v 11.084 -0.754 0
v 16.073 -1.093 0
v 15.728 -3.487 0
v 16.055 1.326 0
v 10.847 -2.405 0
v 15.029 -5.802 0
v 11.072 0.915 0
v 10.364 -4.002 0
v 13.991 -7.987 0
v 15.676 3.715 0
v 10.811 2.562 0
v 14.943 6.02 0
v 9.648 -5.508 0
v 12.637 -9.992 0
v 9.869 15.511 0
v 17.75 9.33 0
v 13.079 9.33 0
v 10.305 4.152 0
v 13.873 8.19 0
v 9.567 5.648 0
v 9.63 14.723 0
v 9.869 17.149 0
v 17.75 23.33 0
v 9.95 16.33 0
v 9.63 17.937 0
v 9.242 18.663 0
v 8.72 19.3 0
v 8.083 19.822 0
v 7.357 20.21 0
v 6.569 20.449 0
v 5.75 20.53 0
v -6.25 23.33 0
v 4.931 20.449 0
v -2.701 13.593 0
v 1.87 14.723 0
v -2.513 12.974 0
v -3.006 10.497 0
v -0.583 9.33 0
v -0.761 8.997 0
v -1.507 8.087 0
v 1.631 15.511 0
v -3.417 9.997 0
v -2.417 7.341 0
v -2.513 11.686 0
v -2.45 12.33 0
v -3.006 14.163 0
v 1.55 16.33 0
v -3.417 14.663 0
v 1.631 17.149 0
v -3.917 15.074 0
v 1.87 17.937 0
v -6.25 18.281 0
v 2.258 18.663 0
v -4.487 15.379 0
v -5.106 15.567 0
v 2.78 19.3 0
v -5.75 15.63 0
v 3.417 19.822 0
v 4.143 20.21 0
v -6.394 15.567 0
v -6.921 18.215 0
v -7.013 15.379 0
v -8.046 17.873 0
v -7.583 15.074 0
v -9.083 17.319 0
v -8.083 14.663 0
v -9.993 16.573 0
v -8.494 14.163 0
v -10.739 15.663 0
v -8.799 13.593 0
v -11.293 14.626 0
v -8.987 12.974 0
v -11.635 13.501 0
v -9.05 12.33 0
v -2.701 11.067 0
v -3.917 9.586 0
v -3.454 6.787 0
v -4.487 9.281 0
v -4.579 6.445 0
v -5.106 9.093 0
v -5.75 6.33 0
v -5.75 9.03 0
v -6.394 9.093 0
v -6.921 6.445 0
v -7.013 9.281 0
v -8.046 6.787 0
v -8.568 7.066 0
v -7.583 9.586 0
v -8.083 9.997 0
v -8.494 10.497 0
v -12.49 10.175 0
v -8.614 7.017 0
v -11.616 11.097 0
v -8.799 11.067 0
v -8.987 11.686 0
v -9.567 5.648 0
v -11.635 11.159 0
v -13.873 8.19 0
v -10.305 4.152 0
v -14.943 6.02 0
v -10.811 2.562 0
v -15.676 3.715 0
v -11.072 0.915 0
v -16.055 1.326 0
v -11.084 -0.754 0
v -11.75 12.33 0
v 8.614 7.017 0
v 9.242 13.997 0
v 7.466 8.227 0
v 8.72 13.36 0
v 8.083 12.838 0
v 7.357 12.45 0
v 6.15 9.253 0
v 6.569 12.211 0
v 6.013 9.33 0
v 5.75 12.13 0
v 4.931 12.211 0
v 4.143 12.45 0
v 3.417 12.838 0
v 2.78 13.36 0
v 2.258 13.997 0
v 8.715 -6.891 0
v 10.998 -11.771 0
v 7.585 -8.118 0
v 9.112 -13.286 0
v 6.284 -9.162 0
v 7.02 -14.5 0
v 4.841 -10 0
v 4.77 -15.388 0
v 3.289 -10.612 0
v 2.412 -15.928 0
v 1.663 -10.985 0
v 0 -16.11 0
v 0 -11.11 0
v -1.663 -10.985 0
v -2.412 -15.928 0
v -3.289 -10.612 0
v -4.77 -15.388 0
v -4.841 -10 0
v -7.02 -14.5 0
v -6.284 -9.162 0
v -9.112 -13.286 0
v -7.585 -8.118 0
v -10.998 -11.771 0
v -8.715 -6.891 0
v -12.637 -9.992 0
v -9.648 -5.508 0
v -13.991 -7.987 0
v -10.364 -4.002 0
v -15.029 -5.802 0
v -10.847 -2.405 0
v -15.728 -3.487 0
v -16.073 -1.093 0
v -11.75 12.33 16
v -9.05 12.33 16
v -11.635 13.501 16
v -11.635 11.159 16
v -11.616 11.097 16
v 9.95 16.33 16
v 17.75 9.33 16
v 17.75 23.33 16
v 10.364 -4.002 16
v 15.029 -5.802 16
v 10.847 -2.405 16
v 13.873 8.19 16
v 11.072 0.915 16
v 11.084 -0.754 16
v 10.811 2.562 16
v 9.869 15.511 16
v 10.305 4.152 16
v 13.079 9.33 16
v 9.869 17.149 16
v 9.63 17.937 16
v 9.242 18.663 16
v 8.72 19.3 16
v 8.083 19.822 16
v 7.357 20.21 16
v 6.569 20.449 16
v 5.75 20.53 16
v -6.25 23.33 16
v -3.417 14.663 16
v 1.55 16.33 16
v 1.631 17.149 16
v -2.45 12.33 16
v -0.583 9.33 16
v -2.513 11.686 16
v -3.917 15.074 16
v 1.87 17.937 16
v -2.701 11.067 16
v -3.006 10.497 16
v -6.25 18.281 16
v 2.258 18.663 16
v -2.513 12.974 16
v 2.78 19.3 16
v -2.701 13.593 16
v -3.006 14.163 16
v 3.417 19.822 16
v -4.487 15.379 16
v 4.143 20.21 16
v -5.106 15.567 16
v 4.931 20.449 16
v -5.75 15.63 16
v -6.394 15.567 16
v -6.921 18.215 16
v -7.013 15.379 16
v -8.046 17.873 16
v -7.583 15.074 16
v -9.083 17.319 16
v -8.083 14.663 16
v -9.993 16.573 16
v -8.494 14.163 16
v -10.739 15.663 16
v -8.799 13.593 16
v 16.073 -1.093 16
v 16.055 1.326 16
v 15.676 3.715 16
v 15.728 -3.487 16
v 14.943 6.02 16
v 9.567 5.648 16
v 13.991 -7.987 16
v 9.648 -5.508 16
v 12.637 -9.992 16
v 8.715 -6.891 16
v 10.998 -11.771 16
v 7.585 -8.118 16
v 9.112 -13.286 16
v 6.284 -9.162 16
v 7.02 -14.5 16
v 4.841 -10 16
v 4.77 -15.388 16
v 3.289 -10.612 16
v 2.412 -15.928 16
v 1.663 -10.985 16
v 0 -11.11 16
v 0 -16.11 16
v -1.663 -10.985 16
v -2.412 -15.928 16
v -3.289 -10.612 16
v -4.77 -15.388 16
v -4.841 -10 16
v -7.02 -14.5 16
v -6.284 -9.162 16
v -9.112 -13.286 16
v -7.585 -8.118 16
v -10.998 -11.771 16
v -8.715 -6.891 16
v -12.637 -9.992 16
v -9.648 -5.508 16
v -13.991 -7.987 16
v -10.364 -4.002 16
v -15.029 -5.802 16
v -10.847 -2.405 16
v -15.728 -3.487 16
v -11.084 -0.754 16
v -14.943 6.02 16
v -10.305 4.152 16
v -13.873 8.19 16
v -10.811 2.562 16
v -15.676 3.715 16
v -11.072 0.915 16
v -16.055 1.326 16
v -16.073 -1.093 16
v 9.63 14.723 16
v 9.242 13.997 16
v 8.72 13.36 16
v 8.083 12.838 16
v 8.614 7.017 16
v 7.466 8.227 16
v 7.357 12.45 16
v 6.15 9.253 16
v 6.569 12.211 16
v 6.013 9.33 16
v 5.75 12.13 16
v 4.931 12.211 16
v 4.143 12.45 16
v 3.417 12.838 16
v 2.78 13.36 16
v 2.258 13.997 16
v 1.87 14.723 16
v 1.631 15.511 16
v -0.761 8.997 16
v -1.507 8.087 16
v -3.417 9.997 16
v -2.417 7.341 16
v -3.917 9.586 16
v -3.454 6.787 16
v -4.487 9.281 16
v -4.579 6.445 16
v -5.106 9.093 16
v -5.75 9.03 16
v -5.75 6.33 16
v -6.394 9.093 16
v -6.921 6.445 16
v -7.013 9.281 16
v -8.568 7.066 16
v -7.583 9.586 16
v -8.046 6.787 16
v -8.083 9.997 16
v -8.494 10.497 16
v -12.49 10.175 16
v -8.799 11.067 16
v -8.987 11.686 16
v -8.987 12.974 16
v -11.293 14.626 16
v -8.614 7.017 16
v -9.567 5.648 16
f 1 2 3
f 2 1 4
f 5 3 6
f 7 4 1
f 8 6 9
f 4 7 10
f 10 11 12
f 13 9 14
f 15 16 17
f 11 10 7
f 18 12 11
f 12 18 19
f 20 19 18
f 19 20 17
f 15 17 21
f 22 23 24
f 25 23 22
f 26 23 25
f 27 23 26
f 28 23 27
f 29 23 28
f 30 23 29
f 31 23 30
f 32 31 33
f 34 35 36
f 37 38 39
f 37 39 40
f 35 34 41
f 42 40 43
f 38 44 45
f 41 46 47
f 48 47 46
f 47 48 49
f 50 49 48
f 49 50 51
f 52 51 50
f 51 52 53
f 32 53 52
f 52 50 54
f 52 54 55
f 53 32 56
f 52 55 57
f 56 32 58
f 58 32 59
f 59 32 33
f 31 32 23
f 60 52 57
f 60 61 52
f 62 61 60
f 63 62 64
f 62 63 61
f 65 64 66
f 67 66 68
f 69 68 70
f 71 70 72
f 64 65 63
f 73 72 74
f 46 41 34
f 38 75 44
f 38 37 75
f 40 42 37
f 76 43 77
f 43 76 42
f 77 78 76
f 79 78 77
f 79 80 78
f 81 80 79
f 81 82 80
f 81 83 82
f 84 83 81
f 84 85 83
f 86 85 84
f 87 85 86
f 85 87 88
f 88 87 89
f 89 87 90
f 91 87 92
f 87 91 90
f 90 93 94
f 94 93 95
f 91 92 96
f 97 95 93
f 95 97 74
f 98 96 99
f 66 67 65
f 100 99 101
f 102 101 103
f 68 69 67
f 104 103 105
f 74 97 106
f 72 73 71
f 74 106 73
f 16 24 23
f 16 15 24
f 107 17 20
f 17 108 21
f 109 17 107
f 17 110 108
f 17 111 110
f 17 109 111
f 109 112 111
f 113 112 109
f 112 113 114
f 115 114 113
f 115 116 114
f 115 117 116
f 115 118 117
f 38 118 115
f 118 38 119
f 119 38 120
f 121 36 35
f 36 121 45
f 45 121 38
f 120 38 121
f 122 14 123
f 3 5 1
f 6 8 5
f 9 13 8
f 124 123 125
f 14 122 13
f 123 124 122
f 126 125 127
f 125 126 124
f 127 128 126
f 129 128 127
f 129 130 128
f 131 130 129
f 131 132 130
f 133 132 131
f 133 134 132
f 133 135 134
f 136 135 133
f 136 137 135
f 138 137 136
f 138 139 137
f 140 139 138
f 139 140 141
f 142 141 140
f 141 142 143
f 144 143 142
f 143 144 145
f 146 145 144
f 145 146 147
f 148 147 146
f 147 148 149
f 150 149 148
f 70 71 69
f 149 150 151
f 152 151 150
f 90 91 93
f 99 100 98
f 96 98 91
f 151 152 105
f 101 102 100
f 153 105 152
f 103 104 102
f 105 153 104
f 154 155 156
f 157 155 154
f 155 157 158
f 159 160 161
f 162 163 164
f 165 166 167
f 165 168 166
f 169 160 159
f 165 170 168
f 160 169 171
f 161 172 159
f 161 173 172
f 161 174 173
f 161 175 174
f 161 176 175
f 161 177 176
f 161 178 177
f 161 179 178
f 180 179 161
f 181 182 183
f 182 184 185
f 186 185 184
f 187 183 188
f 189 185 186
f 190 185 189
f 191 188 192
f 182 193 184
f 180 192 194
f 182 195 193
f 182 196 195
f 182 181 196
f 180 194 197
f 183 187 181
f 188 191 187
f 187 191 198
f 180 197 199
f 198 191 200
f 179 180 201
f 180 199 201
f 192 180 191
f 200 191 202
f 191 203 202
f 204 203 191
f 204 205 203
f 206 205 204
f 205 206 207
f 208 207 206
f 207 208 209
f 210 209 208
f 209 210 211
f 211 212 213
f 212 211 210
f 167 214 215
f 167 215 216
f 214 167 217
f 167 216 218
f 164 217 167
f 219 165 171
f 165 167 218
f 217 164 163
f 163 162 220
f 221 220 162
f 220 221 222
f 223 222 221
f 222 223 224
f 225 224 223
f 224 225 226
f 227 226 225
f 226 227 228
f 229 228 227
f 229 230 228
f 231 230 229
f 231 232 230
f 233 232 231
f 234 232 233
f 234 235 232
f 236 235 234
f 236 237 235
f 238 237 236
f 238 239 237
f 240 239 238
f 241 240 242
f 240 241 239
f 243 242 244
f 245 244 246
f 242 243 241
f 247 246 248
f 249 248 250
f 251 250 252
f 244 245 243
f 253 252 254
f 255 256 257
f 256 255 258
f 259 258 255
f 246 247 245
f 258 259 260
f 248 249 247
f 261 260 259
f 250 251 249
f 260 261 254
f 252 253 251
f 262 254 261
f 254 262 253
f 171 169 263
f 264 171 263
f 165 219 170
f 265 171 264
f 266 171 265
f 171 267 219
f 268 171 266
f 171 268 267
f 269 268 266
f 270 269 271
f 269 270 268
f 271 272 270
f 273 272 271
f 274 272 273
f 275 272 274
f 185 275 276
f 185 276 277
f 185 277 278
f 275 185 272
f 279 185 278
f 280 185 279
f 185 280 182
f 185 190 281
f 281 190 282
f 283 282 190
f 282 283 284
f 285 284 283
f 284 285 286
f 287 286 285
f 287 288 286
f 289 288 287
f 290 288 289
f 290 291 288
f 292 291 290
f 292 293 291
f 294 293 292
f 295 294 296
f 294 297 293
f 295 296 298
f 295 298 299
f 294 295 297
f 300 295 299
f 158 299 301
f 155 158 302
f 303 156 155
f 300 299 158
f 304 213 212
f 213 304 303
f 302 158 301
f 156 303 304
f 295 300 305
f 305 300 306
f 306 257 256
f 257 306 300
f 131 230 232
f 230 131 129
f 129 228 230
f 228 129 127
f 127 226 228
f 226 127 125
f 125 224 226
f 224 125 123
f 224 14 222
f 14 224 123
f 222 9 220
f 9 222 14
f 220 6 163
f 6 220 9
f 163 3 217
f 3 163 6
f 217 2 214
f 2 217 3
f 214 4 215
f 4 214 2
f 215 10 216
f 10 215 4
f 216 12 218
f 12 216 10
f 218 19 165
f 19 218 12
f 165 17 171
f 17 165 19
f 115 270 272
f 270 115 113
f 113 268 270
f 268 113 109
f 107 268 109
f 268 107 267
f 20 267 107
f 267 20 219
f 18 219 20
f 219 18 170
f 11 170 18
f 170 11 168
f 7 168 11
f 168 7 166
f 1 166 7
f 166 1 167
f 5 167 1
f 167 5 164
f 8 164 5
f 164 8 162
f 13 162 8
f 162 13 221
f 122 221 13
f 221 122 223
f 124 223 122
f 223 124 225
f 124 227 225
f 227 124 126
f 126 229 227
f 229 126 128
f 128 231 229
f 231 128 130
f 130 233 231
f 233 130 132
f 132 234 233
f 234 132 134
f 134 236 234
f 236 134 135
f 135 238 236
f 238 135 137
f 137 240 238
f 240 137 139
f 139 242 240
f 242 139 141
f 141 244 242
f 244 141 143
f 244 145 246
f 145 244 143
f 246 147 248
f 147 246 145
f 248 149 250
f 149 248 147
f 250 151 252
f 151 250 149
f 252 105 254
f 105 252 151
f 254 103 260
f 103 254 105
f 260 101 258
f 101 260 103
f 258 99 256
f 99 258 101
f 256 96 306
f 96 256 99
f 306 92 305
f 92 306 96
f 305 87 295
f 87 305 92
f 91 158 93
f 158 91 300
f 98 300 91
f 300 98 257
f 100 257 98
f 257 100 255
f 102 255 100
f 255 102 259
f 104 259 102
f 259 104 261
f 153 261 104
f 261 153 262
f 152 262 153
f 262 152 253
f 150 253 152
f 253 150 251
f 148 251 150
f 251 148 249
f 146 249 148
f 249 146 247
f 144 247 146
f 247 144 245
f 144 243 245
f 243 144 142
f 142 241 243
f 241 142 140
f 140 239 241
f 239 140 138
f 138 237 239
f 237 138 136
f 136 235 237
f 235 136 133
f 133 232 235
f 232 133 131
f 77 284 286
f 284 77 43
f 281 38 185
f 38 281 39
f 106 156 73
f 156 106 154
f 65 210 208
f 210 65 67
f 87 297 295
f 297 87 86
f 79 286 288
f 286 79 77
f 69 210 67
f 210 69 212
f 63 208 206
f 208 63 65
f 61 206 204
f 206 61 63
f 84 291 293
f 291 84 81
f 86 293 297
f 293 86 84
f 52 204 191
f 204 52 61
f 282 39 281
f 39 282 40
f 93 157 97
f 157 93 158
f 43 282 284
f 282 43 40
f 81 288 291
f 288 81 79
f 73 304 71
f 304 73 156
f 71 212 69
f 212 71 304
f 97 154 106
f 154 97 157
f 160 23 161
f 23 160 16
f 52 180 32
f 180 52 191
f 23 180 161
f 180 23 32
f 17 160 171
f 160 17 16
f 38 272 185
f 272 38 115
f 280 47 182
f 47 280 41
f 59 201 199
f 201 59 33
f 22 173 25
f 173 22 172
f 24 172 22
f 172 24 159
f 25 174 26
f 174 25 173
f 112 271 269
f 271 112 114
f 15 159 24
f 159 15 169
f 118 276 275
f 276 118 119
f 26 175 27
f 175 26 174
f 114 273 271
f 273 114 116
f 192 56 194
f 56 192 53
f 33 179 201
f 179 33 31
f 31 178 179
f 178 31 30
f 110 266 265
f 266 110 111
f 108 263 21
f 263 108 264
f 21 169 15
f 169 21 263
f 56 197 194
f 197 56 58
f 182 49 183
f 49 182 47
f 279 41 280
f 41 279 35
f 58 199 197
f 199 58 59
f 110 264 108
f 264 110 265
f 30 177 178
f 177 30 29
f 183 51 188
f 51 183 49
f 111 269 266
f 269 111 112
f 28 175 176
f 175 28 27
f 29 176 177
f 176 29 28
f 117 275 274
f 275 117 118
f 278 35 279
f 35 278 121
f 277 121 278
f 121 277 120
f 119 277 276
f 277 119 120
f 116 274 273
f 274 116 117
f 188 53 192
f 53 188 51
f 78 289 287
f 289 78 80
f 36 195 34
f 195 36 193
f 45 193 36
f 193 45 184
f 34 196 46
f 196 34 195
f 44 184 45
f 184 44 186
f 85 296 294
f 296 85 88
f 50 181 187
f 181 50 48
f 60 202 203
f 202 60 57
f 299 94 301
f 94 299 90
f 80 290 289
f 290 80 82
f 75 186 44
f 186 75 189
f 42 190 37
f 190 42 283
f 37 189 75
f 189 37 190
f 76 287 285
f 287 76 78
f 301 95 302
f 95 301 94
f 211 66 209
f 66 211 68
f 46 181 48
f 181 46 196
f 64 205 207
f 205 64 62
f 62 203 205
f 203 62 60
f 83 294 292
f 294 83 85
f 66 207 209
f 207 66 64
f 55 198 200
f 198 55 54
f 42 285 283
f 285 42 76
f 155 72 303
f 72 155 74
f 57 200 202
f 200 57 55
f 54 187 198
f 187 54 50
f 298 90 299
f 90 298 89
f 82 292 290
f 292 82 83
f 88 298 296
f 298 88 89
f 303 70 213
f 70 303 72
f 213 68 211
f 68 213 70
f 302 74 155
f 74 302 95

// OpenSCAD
$fn = 32;

// ----------------------------------------------------------------------
// Pipe clamp: 32.22 mm ring, 5 mm wall, 16 mm wide
// ----------------------------------------------------------------------

// --- parameters (mm) ---
outer_r = 16.11;          // clamp outside radius
inner_r = 11.11;          // pipe bore radius
band = 5;                 // band thickness
clamp_w = 16;             // clamp width
opening = 50;             // opening angle between the ends
lug_w = 24;               // lug width
lug_len = 14;             // lug length
bolt_d = 8.4;             // bolt hole
knuckle_d = 12;           // hinge knuckle diameter
pin_d = 6.6;              // hinge pin hole

clamp_profile = [[-6.808, 14.601], [-8.918, 13.417], [-10.826, 11.93], [-12.49, 10.175], [-13.873, 8.19], [-14.943, 6.02], [-15.676, 3.715], [-16.055, 1.326], [-16.073, -1.093], [-15.728, -3.487], [-15.029, -5.802], [-13.991, -7.987], [-12.637, -9.992], [-10.998, -11.771], [-9.112, -13.286], [-7.02, -14.5], [-4.77, -15.388], [-2.412, -15.928], [0, -16.11], [2.412, -15.928], [4.77, -15.388], [7.02, -14.5], [9.112, -13.286], [10.998, -11.771], [12.637, -9.992], [13.991, -7.987], [15.029, -5.802], [15.728, -3.487], [16.073, -1.093], [16.055, 1.326], [15.676, 3.715], [14.943, 6.02], [13.873, 8.19], [12.49, 10.175], [10.826, 11.93], [8.918, 13.417], [6.808, 14.601], [4.695, 10.069], [6.15, 9.253], [7.466, 8.227], [8.614, 7.017], [9.567, 5.648], [10.305, 4.152], [10.811, 2.562], [11.072, 0.915], [11.084, -0.754], [10.847, -2.405], [10.364, -4.002], [9.648, -5.508], [8.715, -6.891], [7.585, -8.118], [6.284, -9.162], [4.841, -10], [3.289, -10.612], [1.663, -10.985], [0, -11.11], [-1.663, -10.985], [-3.289, -10.612], [-4.841, -10], [-6.284, -9.162], [-7.585, -8.118], [-8.715, -6.891], [-9.648, -5.508], [-10.364, -4.002], [-10.847, -2.405], [-11.084, -0.754], [-11.072, 0.915], [-10.811, 2.562], [-10.305, 4.152], [-9.567, 5.648], [-8.614, 7.017], [-7.466, 8.227], [-6.15, 9.253], [-4.695, 10.069]];

difference() {
  union() {
    linear_extrude(height = clamp_w) polygon(clamp_profile);
    /* hinge knuckle, sunk 2 mm into the band end */
    translate([-5.75, 12.33, 0]) cylinder(h = clamp_w, d = knuckle_d);
    /* bolt lug on the other end */
    translate([-6.25, 9.33, 0]) cube([lug_w, 14, clamp_w]);
  }
  translate([5.75, 16.33, -2.5]) cylinder(h = clamp_w + 5, d = bolt_d);
  translate([-5.75, 12.33, -2.5]) cylinder(h = clamp_w + 5, d = pin_d);
}
